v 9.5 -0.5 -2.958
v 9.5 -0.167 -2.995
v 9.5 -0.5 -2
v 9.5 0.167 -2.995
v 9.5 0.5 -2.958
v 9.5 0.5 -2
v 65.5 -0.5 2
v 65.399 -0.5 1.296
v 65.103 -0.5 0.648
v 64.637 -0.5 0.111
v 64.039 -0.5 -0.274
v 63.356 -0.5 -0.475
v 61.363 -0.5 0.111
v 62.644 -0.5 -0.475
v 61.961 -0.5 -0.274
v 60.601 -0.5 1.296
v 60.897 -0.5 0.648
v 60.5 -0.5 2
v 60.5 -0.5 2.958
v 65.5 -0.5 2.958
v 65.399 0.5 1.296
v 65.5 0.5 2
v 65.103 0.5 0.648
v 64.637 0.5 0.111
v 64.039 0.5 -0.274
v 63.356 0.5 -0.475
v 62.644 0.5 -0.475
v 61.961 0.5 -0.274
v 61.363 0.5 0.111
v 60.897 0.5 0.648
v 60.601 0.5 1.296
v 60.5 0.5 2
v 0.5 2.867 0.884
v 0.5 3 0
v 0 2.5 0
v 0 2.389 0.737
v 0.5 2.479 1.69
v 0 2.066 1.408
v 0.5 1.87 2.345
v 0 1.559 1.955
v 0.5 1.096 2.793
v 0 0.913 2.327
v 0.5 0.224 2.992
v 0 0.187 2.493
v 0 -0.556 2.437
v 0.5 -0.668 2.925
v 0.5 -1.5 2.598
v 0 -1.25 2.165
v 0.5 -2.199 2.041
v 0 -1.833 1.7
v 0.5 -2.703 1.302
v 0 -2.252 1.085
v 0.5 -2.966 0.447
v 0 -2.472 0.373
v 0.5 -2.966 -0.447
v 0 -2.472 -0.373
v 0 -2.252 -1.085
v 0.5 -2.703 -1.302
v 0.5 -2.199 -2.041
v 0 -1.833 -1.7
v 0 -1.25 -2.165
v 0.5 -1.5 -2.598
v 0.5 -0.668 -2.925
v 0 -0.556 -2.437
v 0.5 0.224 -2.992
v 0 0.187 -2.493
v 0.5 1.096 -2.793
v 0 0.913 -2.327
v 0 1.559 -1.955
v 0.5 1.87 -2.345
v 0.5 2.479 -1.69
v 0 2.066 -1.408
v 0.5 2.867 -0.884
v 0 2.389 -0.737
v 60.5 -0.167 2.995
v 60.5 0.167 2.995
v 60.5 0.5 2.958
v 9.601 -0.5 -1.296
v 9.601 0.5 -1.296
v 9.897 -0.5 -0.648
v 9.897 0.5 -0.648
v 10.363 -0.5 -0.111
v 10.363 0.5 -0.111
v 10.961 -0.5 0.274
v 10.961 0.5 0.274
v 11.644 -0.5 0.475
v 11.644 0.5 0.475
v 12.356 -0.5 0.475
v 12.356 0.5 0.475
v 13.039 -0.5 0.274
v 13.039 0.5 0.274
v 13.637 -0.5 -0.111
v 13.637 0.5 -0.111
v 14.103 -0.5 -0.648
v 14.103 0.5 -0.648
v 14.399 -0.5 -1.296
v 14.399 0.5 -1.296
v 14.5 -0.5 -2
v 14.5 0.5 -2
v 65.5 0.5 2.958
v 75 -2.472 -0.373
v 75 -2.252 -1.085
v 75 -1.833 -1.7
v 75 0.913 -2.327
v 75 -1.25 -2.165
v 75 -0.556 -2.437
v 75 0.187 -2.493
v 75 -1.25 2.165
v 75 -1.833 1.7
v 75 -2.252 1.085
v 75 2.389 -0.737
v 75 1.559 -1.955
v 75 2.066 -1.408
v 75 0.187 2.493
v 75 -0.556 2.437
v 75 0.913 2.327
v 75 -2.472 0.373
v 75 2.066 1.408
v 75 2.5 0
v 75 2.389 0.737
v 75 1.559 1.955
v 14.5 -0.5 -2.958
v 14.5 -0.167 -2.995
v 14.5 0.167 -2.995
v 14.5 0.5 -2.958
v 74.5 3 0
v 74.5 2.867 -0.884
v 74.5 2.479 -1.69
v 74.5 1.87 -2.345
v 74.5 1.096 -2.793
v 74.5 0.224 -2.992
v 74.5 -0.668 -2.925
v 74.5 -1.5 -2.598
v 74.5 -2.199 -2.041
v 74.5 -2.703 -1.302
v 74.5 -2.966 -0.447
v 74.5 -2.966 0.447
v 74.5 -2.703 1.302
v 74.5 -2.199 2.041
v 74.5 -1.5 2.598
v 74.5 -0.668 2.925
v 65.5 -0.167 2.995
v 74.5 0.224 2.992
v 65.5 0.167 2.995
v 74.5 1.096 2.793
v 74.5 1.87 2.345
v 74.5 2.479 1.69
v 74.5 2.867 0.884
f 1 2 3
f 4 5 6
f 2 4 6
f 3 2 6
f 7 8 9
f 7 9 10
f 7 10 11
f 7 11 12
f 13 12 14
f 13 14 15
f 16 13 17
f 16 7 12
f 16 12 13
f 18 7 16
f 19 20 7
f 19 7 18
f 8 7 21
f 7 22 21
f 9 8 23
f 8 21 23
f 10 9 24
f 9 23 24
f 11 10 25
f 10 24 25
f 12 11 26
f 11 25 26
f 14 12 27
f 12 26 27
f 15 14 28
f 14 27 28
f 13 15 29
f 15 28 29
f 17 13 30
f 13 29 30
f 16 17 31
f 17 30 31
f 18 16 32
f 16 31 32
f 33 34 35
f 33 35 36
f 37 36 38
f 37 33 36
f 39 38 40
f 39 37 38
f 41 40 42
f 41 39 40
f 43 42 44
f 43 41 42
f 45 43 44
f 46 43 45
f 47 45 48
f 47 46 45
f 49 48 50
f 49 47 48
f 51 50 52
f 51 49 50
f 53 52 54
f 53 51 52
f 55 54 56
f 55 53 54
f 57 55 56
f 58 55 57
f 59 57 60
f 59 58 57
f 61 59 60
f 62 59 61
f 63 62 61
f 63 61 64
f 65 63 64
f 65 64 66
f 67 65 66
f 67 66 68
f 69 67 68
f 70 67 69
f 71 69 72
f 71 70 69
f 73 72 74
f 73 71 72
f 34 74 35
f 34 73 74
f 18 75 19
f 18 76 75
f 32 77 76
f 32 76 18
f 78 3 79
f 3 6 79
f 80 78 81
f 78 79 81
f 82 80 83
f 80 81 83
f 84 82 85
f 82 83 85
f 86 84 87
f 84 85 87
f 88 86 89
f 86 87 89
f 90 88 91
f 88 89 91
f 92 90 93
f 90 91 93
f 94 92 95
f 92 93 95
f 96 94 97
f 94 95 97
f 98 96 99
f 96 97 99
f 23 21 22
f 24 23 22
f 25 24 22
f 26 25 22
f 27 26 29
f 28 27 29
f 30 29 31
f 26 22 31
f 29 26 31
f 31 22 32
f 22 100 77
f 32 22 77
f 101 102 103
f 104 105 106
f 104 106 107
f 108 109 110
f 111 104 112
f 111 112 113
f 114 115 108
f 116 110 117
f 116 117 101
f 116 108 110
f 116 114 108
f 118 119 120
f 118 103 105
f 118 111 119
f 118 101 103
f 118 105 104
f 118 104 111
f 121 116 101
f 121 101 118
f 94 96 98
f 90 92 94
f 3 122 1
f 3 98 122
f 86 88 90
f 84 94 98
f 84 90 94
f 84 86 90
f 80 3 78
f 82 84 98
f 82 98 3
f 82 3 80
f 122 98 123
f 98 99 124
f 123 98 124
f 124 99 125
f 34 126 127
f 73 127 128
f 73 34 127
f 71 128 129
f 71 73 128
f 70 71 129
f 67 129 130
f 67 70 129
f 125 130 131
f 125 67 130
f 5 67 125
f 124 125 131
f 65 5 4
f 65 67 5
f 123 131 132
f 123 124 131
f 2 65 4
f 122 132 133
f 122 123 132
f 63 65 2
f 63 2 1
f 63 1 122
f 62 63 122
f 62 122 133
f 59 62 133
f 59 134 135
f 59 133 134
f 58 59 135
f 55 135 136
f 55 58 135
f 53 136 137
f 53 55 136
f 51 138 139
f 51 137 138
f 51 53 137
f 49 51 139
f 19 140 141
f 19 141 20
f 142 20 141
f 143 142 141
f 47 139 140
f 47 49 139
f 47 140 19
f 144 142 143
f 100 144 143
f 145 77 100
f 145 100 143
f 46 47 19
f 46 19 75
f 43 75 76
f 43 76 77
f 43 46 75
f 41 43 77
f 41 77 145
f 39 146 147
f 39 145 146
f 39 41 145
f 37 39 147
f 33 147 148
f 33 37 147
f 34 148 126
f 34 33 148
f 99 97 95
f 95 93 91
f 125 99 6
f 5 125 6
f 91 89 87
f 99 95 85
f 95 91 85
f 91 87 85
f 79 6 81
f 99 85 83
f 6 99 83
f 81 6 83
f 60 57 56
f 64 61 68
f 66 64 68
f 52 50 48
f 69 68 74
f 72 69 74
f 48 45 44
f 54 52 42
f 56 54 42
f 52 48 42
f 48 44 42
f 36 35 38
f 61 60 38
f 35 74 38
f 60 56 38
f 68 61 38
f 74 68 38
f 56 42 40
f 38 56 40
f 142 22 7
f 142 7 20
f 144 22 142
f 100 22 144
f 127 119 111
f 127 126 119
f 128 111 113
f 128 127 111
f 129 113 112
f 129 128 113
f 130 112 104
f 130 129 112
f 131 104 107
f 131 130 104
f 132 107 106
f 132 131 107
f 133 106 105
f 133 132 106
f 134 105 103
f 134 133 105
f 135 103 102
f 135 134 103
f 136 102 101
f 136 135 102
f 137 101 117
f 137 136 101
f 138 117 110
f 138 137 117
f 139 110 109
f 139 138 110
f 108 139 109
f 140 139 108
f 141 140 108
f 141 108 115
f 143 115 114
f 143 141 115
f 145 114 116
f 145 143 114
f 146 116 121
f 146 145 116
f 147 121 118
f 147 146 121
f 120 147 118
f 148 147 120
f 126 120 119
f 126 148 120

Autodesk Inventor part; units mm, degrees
ref_plane "YZ Plane" through (0, 0, 0) normal (1, 0, 0) x (0, 1, 0)
ref_plane "XZ Plane" through (0, 0, 0) normal (0, 1, 0) x (-1, 0, 0)
ref_plane "XY Plane" through (0, 0, 0) normal (0, 0, 1) x (1, 0, 0)
sketch "Esboço1" plane through (0, 0, 0) normal (0, 0, 1) x (1, 0, 0)
  line L0 (0, 0) -> (75, 0)
  line L1 (75, 0) -> (75, 3)
  line L2 (75, 3) -> (0, 3)
  line L3 (0, 3) -> (0, 0)
  dimension "d0" = 75
  dimension "d1" = 3
revolve "Revolução1" add sketch "Esboço1" angle 360 about axis through (0, 0, 0) along (1, 0, 0)
sketch "Esboço2" plane through (0, 0, 0) normal (0, 1, 0) x (-1, 0, 0)
  point P0 (0, 0)
chamfer "Chanfro1" distance 0.5 angle 45 2 edges at (0, -3, 0) (75, -3, 0)
sketch "Esboço3" plane through (0, 0, 0) normal (0, 1, 0) x (-1, 0, 0)
  line L0 (0, 2.5) -> (0, -2.5) projected
  line L1 (-75, 2.5) -> (-74.5, 3) projected
  line L2 (-74.5, 3) -> (-0.5, 3) projected
  line L3 (-0.5, 3) -> (0, 2.5) projected
  line L4 (0, 2.5) -> (0, -2.5) projected
  line L5 (0, -2.5) -> (-0.5, -3) projected
  line L6 (-0.5, -3) -> (-74.5, -3) projected
  line L7 (-74.5, -3) -> (-75, -2.5) projected
  line L8 (-75, -2.5) -> (-75, 2.5) projected
  arc A0 (-9.5, -2) -> (-14.5, -2) centre (-12, -2) ccw
  line L9 (-65.5, 2) -> (-65.5, 3)
  line L10 (-60.5, 3) -> (-60.5, 2)
  arc A1 (-60.7087, 3) -> (-65.2913, 3) centre (-63, 2) ccw
  arc A2 (-65.5, 2) -> (-60.5, 2) centre (-63, 2) ccw
  line L11 (-65.5, 3) -> (-65.2913, 3)
  line L12 (-60.7087, 3) -> (-60.5, 3)
  line L13 (-75, 2.5) -> (-74.5, 3) projected
  line L14 (-74.5, 3) -> (-0.5, 3) projected
  line L15 (-0.5, 3) -> (0, 2.5) projected
  line L16 (0, 2.5) -> (0, -2.5) projected
  line L17 (0, -2.5) -> (-0.5, -3) projected
  line L18 (-0.5, -3) -> (-74.5, -3) projected
  line L19 (-74.5, -3) -> (-75, -2.5) projected
  line L20 (-75, -2.5) -> (-75, 2.5) projected
  line L21 (-0.5, -3) -> (-0.5, 3) projected
  line L22 (-74.5, 3) -> (-74.5, -3) projected
  line L23 (-75, 2.5) -> (-74.5, 3) projected
  line L24 (-74.5, 3) -> (-0.5, 3) projected
  line L25 (-0.5, 3) -> (0, 2.5) projected
  line L26 (0, 2.5) -> (0, -2.5) projected
  line L27 (0, -2.5) -> (-0.5, -3) projected
  line L28 (-0.5, -3) -> (-74.5, -3) projected
  line L29 (-74.5, -3) -> (-75, -2.5) projected
  line L30 (-75, -2.5) -> (-75, 2.5) projected
  line L31 (-14.5, -2) -> (-14.5, -5)
  line L32 (-14.5, -5) -> (-9.5, -5)
  line L33 (-9.5, -5) -> (-9.5, -2)
  point P0 (0, 0)
  point P1 (-14.5, -3)
  point P2 (-9.5, -3)
  point P3 (-14.5, -3)
  point P4 (-9.5, -3)
  dimension "d10" = 12
  dimension "d12" = 12
  dimension "d17" = 2.5
  dimension "d19" = 5
  dimension "d20" = 3
  dimension "d21" = 1
extrude "Extrusão1" cut sketch "Esboço3" against normal mid plane 1 contours L10 A2 L9 L2 | L6 L31 A0 L33 | L2 A1
properties part number "Mainpulo"
